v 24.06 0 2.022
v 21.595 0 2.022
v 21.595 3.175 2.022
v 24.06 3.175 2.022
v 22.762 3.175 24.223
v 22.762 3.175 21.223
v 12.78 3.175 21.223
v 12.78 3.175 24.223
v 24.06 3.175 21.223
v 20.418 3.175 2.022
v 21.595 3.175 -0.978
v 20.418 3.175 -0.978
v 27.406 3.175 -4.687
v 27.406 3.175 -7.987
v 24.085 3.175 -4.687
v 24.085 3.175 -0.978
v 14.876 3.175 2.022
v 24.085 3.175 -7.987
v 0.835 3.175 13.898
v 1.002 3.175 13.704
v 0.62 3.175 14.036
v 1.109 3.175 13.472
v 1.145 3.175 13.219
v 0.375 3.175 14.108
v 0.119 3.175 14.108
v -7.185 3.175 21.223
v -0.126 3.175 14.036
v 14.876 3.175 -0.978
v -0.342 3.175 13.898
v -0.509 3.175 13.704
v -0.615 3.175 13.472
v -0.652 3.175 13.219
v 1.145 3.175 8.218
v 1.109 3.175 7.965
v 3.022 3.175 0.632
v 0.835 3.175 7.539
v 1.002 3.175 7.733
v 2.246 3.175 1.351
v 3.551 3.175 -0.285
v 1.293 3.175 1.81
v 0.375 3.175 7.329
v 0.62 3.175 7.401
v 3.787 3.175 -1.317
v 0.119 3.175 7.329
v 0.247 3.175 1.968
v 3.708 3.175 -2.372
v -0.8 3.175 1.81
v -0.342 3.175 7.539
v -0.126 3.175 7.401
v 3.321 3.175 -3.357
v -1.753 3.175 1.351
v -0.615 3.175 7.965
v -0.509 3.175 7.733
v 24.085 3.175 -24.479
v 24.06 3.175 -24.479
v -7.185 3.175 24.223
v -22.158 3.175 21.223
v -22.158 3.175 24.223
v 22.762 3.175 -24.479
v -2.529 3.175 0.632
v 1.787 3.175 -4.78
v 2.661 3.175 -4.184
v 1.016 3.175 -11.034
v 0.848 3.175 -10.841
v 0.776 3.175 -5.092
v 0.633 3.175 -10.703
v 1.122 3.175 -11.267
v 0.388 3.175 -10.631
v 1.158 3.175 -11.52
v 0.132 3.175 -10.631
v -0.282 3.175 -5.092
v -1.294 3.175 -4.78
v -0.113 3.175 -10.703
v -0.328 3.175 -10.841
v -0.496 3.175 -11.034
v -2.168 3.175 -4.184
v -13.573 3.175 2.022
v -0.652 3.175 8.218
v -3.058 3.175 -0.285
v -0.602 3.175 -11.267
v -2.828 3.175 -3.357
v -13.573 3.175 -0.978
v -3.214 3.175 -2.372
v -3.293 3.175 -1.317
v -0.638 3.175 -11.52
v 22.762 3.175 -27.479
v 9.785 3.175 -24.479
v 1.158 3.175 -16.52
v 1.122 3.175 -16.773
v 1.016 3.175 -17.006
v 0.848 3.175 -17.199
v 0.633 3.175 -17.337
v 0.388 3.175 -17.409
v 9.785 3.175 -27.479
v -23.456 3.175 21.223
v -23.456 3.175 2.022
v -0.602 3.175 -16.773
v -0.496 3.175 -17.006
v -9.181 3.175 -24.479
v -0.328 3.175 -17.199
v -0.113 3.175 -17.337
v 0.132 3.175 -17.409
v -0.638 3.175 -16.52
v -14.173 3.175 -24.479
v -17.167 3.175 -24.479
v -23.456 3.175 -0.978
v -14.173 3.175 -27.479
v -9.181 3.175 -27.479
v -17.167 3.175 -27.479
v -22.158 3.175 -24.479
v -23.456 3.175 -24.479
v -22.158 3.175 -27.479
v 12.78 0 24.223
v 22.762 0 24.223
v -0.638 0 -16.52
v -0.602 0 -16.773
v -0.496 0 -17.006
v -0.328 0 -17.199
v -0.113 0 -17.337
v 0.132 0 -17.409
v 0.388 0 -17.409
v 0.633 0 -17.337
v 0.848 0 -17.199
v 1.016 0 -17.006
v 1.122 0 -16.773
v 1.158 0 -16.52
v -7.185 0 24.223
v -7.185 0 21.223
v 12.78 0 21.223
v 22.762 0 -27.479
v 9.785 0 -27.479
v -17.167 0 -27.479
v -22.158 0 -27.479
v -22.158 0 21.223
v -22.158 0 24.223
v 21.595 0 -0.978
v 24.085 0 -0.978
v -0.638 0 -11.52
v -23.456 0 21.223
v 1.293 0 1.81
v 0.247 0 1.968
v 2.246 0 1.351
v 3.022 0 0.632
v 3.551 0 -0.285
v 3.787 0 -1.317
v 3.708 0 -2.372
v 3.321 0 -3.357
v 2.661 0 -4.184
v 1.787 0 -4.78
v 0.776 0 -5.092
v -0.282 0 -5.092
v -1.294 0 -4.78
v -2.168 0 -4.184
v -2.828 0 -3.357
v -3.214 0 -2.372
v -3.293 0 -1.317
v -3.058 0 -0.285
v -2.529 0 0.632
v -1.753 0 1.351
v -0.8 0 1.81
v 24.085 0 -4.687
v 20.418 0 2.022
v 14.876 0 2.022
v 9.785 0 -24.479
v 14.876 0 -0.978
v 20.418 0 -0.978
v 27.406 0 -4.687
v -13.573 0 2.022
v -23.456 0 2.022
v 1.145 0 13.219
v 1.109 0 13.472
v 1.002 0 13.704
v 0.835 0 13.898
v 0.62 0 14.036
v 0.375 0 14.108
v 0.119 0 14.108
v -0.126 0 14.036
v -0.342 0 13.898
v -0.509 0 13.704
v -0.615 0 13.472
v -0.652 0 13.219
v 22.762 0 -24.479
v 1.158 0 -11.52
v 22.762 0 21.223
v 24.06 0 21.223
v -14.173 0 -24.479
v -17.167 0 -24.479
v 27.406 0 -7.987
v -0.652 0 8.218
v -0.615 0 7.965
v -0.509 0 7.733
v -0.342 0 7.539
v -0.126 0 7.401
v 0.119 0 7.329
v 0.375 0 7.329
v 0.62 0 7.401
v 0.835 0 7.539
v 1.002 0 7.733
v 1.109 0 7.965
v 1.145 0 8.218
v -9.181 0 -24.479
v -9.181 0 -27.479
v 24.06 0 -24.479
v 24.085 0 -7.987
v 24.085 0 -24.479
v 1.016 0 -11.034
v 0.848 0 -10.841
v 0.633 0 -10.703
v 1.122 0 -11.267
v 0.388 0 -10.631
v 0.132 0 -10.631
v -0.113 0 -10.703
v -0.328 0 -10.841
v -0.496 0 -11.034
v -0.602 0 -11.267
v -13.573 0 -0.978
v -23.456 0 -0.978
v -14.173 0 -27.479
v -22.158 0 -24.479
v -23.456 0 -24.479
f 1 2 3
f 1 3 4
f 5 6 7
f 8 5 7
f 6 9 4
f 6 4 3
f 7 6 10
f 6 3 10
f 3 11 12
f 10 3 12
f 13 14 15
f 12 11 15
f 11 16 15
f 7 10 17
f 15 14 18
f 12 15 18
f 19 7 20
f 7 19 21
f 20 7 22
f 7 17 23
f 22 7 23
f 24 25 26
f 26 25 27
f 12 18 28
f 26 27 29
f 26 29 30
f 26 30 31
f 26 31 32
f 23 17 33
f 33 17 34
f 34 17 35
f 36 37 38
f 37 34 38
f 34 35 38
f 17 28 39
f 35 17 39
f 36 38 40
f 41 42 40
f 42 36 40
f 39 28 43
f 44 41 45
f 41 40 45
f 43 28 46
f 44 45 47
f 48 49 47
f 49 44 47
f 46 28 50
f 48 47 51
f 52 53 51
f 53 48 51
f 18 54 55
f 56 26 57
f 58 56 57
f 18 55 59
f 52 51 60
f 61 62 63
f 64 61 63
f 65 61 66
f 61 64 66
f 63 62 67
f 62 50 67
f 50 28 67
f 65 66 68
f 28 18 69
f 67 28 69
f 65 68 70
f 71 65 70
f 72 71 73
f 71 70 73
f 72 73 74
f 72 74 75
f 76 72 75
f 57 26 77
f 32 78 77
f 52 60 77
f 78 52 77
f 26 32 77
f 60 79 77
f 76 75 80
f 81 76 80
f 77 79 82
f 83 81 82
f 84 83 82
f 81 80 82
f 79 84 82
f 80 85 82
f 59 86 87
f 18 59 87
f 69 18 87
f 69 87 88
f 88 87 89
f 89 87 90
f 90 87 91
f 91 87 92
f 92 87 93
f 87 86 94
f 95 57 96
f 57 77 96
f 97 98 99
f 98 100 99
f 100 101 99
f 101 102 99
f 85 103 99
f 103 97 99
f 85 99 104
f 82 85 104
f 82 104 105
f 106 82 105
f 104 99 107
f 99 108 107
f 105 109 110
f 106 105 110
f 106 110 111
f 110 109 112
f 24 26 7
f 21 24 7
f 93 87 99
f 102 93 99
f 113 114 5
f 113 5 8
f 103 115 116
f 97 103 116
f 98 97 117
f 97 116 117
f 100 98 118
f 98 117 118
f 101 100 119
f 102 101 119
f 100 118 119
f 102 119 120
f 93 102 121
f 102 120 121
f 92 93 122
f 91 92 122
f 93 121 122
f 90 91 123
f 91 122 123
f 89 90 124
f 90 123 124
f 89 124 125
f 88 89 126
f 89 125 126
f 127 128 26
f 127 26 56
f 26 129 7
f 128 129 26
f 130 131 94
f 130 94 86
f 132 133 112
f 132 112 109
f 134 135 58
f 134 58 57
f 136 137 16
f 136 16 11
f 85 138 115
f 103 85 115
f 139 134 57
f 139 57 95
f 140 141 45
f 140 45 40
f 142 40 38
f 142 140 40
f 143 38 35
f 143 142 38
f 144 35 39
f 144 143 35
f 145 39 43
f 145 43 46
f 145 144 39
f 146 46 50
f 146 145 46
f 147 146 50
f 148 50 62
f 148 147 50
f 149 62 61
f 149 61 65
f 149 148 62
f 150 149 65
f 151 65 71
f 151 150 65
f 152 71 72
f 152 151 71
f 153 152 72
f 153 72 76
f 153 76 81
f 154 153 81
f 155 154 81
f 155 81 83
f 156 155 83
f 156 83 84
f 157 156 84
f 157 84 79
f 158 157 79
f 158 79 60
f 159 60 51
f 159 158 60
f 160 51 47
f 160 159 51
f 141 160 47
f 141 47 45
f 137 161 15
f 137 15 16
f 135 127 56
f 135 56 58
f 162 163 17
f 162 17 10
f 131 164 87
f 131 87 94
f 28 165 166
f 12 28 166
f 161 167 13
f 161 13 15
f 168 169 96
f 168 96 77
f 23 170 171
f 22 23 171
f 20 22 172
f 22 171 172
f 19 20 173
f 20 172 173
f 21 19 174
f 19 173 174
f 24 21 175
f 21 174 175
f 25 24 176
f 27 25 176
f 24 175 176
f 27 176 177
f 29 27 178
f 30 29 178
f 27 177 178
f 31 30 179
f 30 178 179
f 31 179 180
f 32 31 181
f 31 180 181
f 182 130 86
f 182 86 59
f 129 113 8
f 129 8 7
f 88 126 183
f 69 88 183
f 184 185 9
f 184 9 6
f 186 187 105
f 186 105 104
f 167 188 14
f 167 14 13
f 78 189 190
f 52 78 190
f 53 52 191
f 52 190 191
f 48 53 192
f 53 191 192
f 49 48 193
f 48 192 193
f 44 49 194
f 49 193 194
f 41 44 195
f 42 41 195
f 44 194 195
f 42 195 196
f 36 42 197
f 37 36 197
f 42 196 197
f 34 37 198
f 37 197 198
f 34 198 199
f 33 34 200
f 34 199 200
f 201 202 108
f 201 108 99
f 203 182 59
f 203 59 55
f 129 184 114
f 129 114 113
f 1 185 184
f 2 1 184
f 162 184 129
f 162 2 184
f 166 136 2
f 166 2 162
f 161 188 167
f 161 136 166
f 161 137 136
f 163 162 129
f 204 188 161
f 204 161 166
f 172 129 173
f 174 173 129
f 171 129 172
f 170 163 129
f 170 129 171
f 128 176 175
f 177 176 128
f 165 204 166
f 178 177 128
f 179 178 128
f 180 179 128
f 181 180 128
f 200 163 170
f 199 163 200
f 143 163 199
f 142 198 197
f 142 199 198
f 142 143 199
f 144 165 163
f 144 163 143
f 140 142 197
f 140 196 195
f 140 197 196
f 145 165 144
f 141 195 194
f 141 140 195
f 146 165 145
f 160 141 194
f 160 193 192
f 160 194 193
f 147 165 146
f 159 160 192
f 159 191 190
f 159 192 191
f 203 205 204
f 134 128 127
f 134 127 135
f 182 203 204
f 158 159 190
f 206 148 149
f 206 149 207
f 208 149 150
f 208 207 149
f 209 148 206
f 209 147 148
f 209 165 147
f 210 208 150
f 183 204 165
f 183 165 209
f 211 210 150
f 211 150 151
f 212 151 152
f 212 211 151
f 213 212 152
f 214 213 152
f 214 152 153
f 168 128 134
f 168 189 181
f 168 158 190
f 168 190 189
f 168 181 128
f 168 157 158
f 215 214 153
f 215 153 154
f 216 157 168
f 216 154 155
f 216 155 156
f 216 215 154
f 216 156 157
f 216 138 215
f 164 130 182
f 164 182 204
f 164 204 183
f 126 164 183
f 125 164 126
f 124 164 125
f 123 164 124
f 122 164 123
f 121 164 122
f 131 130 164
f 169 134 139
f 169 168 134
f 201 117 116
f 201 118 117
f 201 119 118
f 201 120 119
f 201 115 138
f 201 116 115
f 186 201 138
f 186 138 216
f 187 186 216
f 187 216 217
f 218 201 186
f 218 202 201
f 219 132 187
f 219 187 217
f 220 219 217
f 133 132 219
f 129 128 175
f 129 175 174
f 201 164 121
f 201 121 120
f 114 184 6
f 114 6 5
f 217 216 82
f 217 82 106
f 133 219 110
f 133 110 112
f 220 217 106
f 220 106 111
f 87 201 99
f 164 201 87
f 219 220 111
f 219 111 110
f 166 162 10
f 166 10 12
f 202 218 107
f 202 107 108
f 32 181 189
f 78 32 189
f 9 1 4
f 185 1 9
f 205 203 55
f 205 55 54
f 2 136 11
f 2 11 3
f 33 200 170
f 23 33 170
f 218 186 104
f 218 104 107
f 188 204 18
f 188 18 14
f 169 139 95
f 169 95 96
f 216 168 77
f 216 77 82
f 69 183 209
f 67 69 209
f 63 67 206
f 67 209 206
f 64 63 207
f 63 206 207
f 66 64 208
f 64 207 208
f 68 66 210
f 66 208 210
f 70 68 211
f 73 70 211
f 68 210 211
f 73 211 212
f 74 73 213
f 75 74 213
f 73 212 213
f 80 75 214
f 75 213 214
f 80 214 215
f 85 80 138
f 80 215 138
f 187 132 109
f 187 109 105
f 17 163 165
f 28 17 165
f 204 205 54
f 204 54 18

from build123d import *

# Parameters (mm, degrees)
SKETCH1_R           = 3.550069734
SKETCH1_W           = 5.542666669
SKETCH1_H           = 3.000080526
BOSS_EXTRUDE1_DEPTH = 3.175


with BuildPart() as part:
    # Sketch1 → Boss-Extrude1 (new body)
    with BuildSketch(Plane(origin=(0, 0, 0), x_dir=(1, 0, 0), z_dir=(0, 1, 0))):
        Polygon((21.594595228, 0.978080338), (21.594595228, -2.022000189), (24.059548337, -2.022000189), (24.059548337, -21.222556575), (22.761975246, -21.222556575), (22.761975246, -24.222705465), (12.779622417, -24.222705465), (12.779622417, -21.222556575), (-7.185015001, -21.222556575), (-7.185015001, -24.222705465), (-22.158349273, -24.222705465), (-22.158349273, -21.222556575), (-23.456117337, -21.222556575), (-23.456117337, -2.021873227), (-13.573249368, -2.021873227), (-13.573249368, 0.978275664), (-23.456117336, 0.978275664), (-23.456117336, 24.479227112), (-22.158349272, 24.479227112), (-22.158349272, 27.47917091), (-17.167172857, 27.47917091), (-17.167172857, 24.479227112), (-14.172644433, 24.479227112), (-14.172644433, 27.47917091), (-9.181477767, 27.47917091), (-9.181477767, 24.479227112), (9.784899021, 24.479227112), (9.784899021, 27.47917091), (22.761975247, 27.47917091), (22.761975247, 24.479227112), (24.059548338, 24.479227112), (24.08510927, 24.47910015), (24.08510927, 7.98726625), (27.405593185, 7.98726625), (27.405593185, 4.687262638), (24.08510927, 4.687262638), (24.08510927, 0.978080338), align=None)
        with Locations(Location((0.24664544, 1.581901392, 0), (0, 0, 270))):
            Circle(SKETCH1_R, mode=Mode.SUBTRACT)
        with Locations((17.647010615, -0.521959927)):
            Rectangle(SKETCH1_W, SKETCH1_H, mode=Mode.SUBTRACT)
        with BuildLine():
            Line((-0.638404245, 11.51973711), (-0.638404245, 16.519887597))
            ThreePointArc((-0.638404245, 16.519887597), (0.259966955, 17.418258798), (1.158338156, 16.519887597))
            Line((1.158338156, 16.519887597), (1.158338156, 11.51973711))
            ThreePointArc((1.158338156, 11.51973711), (0.259966955, 10.62136591), (-0.638404245, 11.51973711))
        make_face(mode=Mode.SUBTRACT)
        with BuildLine():
            Line((-0.651633149, -13.218614368), (-0.651633149, -8.218395516))
            ThreePointArc((-0.651633149, -8.218395516), (0.246738051, -7.320024316), (1.145109252, -8.218395516))
            Line((1.145109252, -8.218395516), (1.145109252, -13.218614368))
            ThreePointArc((1.145109252, -13.218614368), (0.246738051, -14.116985568), (-0.651633149, -13.218614368))
        make_face(mode=Mode.SUBTRACT)
    extrude(amount=BOSS_EXTRUDE1_DEPTH)


solid = part.part
